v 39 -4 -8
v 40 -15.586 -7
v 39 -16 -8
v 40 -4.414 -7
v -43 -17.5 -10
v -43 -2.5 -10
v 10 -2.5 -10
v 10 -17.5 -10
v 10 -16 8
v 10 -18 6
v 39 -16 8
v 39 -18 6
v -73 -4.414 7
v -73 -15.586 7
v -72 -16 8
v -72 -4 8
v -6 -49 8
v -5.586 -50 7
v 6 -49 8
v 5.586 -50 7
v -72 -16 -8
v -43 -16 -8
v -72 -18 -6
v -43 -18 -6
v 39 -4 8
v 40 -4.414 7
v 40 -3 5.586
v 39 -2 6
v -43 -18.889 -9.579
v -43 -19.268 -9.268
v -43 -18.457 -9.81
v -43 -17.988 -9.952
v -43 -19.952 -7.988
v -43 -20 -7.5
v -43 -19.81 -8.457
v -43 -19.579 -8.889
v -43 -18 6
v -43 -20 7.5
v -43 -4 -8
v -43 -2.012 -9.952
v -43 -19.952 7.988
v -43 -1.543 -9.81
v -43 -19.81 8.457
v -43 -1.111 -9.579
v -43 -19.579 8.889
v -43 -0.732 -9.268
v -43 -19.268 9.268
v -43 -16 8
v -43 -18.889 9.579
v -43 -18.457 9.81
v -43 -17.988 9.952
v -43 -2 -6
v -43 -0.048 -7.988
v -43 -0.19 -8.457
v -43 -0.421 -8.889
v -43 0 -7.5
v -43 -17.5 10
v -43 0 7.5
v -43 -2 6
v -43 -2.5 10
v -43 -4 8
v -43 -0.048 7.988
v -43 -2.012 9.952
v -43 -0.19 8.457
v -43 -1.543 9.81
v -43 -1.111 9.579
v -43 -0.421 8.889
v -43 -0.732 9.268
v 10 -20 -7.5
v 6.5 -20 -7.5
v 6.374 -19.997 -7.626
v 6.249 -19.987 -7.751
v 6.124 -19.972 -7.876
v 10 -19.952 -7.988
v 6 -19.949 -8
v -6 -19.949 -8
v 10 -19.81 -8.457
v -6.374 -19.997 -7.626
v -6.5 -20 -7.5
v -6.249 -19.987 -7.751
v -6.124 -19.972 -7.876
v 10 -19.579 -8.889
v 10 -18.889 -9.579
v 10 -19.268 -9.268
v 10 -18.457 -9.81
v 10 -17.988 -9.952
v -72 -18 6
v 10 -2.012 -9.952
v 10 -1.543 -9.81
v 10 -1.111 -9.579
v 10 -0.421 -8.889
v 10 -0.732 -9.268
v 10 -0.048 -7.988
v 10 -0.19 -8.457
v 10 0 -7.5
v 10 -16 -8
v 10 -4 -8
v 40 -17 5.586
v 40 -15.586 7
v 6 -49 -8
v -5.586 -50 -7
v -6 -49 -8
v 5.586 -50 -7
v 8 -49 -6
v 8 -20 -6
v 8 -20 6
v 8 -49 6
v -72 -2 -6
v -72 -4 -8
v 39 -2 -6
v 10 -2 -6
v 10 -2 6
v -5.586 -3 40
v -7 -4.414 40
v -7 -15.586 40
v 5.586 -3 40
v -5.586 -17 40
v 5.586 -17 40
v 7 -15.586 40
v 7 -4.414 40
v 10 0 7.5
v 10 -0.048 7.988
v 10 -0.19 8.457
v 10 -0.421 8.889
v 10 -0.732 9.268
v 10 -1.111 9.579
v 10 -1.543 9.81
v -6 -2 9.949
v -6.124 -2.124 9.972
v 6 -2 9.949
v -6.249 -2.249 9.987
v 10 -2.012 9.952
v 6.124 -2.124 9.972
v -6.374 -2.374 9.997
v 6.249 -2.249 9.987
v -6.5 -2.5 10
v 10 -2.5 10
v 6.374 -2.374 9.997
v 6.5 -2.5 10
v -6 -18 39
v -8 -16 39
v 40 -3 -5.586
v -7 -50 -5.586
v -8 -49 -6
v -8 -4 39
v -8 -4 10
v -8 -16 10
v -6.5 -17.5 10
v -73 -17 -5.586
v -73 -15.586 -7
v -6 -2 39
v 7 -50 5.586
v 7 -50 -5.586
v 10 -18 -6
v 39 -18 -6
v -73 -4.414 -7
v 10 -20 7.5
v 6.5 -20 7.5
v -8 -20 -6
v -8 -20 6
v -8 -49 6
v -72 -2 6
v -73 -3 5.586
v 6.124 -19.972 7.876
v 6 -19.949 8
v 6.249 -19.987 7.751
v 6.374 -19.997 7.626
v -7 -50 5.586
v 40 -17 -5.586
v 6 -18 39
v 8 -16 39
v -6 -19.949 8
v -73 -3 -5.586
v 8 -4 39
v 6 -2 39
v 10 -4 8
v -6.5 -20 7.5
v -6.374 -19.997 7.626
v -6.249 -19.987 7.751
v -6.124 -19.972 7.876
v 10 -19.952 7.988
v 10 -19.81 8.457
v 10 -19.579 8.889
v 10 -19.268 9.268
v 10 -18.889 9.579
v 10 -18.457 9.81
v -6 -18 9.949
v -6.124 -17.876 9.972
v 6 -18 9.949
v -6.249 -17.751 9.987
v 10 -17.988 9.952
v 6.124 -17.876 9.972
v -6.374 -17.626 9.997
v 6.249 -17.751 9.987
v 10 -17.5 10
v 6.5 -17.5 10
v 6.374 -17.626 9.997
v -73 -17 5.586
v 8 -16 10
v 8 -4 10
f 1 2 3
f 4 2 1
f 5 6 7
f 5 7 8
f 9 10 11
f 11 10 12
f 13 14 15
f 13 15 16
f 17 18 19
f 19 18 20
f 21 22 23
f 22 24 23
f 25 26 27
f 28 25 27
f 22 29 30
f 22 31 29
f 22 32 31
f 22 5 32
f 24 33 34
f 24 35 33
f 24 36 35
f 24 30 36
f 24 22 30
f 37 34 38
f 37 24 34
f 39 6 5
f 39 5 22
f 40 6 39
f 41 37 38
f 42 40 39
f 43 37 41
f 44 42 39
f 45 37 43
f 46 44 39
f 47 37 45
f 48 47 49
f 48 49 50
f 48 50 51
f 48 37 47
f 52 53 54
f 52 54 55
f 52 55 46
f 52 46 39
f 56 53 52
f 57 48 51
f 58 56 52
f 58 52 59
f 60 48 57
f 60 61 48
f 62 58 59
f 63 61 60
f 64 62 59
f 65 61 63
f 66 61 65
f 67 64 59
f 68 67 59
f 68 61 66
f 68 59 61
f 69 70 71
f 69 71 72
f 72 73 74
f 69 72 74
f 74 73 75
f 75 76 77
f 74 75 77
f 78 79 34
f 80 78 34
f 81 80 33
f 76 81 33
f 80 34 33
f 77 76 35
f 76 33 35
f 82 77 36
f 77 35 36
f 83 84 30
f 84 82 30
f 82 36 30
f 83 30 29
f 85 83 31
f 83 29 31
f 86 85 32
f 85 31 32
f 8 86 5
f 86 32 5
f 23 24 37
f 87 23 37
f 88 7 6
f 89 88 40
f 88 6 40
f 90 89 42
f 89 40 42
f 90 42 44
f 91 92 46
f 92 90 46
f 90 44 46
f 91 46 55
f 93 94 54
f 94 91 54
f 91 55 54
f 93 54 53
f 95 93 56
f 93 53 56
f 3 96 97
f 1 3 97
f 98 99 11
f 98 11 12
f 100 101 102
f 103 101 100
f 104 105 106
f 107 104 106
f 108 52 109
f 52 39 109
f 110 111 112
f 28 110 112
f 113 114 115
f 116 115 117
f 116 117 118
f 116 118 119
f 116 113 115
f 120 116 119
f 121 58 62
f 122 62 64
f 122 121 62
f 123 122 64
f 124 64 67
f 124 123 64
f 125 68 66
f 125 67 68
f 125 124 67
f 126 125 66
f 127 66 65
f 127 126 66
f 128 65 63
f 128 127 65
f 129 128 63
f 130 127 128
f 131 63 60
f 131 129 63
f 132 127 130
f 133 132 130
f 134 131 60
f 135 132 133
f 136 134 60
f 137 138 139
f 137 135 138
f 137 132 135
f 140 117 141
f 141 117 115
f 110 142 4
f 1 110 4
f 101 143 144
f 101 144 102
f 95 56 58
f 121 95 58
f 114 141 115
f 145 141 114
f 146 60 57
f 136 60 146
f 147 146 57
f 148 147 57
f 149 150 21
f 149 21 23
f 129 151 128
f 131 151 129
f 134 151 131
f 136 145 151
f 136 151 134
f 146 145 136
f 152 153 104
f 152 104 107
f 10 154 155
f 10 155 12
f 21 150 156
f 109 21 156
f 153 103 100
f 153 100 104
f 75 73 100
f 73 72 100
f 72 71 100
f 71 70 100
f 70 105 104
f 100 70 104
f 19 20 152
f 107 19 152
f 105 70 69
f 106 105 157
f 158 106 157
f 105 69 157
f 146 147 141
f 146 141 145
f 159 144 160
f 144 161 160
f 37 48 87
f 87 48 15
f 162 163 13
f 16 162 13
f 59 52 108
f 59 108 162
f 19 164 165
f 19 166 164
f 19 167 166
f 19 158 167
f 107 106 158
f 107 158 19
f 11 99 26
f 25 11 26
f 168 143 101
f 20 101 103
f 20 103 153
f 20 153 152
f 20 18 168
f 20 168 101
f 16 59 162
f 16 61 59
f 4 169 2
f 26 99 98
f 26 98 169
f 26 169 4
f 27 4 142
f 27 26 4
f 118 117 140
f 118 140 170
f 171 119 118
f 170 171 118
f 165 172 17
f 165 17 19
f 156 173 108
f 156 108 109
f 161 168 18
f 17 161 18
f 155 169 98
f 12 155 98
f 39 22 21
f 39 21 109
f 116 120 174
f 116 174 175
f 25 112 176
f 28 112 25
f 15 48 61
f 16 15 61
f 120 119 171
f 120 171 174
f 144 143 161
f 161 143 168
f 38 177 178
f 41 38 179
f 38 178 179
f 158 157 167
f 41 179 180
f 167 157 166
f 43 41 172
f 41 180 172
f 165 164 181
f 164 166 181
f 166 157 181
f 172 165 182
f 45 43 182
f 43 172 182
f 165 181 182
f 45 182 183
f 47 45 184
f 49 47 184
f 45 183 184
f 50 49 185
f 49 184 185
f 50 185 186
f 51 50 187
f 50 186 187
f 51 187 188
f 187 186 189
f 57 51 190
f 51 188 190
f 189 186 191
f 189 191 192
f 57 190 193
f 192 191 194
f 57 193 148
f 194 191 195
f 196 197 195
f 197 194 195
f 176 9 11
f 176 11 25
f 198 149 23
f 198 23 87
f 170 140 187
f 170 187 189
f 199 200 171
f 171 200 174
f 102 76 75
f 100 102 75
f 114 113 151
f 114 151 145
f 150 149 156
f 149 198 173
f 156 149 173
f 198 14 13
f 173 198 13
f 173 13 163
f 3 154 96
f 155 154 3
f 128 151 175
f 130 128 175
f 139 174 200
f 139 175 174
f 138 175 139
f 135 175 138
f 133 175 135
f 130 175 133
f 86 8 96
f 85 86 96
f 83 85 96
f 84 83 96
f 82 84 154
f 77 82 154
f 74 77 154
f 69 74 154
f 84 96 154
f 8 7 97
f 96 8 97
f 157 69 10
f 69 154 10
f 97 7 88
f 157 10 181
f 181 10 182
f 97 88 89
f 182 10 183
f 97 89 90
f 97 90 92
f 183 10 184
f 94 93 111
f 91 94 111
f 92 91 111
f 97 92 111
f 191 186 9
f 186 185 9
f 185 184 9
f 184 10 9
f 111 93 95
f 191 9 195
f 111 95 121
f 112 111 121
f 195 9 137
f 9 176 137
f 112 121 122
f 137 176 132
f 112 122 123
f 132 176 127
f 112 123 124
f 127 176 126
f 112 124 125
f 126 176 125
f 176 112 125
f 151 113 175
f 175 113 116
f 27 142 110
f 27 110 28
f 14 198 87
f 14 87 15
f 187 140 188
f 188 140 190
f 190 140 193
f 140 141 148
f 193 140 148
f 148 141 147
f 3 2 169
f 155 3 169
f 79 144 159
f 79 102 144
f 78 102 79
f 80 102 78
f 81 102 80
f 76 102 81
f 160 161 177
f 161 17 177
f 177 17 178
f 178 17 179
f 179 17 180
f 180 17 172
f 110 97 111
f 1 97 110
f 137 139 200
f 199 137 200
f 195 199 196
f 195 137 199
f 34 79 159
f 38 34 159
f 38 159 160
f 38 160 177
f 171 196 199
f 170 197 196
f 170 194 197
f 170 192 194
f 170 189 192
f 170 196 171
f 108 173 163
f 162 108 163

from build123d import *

# Parameters (mm, degrees)
F0_W          = 16
F0_H          = 16
F1_DEPTH      = 50
F0_W_2        = 20
F0_H_2        = 20
F2_DEPTH      = 20
F3_W          = 16
F3_H          = 16
F4_DEPTH      = 40
F5_W          = 16
F5_H          = 16
F6_DEPTH      = 73
F7_W          = 16
F7_H          = 16
F8_DEPTH      = 40
F9_DEPTH      = 33
F10_T1_DEPTH  = 65.5
F10_T6_DEPTH  = 65.5
F10_T11_DEPTH = 65.5
F10_T17_DEPTH = 65.5
F10_T22_DEPTH = 65.5
F10_T27_DEPTH = 65.5
F10_T32_DEPTH = 65.5
F10_T37_DEPTH = 65.5
F10_T42_DEPTH = 65.5
F10_T47_DEPTH = 65.5
F11_SIZE      = 2
F12_SIZE      = 1


# Not quite as in the source:
# - a fillet or chamfer that OpenCascade refuses, or shapes differently, is made with other operations: its cross-section is extruded or revolved along the edge and cut away or added


with BuildPart() as f1:
    # F0 (on Front) → F1 (new body)
    with BuildSketch(Plane.XZ):
        Rectangle(F0_W, F0_H)
    extrude(amount=F1_DEPTH)

    # F0 (on Front) → F2 (join)
    with BuildSketch(Plane.XZ):
        Rectangle(F0_W_2, F0_H_2)
        Rectangle(F0_W, F0_H, mode=Mode.SUBTRACT)
    extrude(amount=F2_DEPTH)

    # F3 (on Right) → F4 (join)
    with BuildSketch(Plane.YZ):
        with Locations((-10, 0)):
            Rectangle(F3_W, F3_H)
    extrude(amount=F4_DEPTH)

    # F5 (on Right) → F6 (join)
    with BuildSketch(Plane.YZ):
        with Locations((-10, 0)):
            Rectangle(F5_W, F5_H)
    extrude(amount=-F6_DEPTH)

    # F7 (on Top) → F8 (join)
    with BuildSketch(Plane.XY):
        with Locations((0, -10)):
            Rectangle(F7_W, F7_H)
    extrude(amount=F8_DEPTH)

    # F9 (add): a face of the model
    f9_faces = [f1.faces().sort_by_distance(p)[0] for p in [
        (-10, -10, 9.7171572875),
    ]]
    extrude(f9_faces, amount=F9_DEPTH)

    # F10: fillet of radius 2.5 on 4 edges, made by hand

    # F10_s2 → F10_t1 (cut)
    with BuildSketch(Plane.YZ.offset(-49.25)):
        with BuildLine():
            ThreePointArc((-2.5, -10), (-0.732233047, -9.267766953), (0, -7.5))
            Line((0, -7.5), (0, -10))
            Line((0, -10), (-2.5, -10))
        make_face()
    extrude(amount=F10_T1_DEPTH, mode=Mode.SUBTRACT)


with BuildPart() as f10_tool4:
    # F10_s5 → F10_t6 (new body)
    with BuildSketch(Plane.YZ.offset(16.25)):
        with BuildLine():
            ThreePointArc((-20, 7.5), (-19.267766953, 9.267766953), (-17.5, 10))
            Line((-17.5, 10), (-20, 10))
            Line((-20, 10), (-20, 7.5))
        make_face()
    extrude(amount=-F10_T6_DEPTH)

    split(bisect_by=Plane.YZ.offset(8), keep=Keep.TOP)


with BuildPart() as f1_1:
    add(f1.part)

    # F10_t3: cut F10_tool4
    add(f10_tool4.part, mode=Mode.SUBTRACT)


with BuildPart() as f10_tool9:
    # F10_s10 → F10_t11 (new body)
    with BuildSketch(Plane.YZ.offset(16.25)):
        with BuildLine():
            ThreePointArc((-20, 7.5), (-19.267766953, 9.267766953), (-17.5, 10))
            Line((-17.5, 10), (-20, 10))
            Line((-20, 10), (-20, 7.5))
        make_face()
    extrude(amount=-F10_T11_DEPTH)

    split(bisect_by=Plane.XY.offset(8), keep=Keep.TOP)

    split(bisect_by=Plane.XZ.offset(18), keep=Keep.TOP)


with BuildPart() as f1_2:
    add(f1_1.part)

    # F10_t8: cut F10_tool9
    add(f10_tool9.part, mode=Mode.SUBTRACT)


with BuildPart() as f10_tool15:
    # F10_s16 → F10_t17 (new body)
    with BuildSketch(Plane.YZ.offset(16.25)):
        with BuildLine():
            ThreePointArc((-20, 7.5), (-19.267766953, 9.267766953), (-17.5, 10))
            Line((-17.5, 10), (-20, 10))
            Line((-20, 10), (-20, 7.5))
        make_face()
    extrude(amount=-F10_T17_DEPTH)

    split(bisect_by=Plane.YZ.offset(-8), keep=Keep.BOTTOM)


with BuildPart() as f1_3:
    add(f1_2.part)

    # F10_t14: cut F10_tool15
    add(f10_tool15.part, mode=Mode.SUBTRACT)


with BuildPart() as f10_tool20:
    # F10_s21 → F10_t22 (new body)
    with BuildSketch(Plane.YZ.offset(-49.25)):
        with BuildLine():
            ThreePointArc((-20, -7.5), (-19.267766953, -9.267766953), (-17.5, -10))
            Line((-17.5, -10), (-20, -10))
            Line((-20, -10), (-20, -7.5))
        make_face()
    extrude(amount=F10_T22_DEPTH)

    split(bisect_by=Plane.YZ.offset(-8), keep=Keep.BOTTOM)


with BuildPart() as f1_4:
    add(f1_3.part)

    # F10_t19: cut F10_tool20
    add(f10_tool20.part, mode=Mode.SUBTRACT)


with BuildPart() as f10_tool25:
    # F10_s26 → F10_t27 (new body)
    with BuildSketch(Plane.YZ.offset(-49.25)):
        with BuildLine():
            ThreePointArc((-20, -7.5), (-19.267766953, -9.267766953), (-17.5, -10))
            Line((-17.5, -10), (-20, -10))
            Line((-20, -10), (-20, -7.5))
        make_face()
    extrude(amount=F10_T27_DEPTH)

    split(bisect_by=Plane.XY.offset(-8), keep=Keep.BOTTOM)


with BuildPart() as f1_5:
    add(f1_4.part)

    # F10_t24: cut F10_tool25
    add(f10_tool25.part, mode=Mode.SUBTRACT)


with BuildPart() as f10_tool30:
    # F10_s31 → F10_t32 (new body)
    with BuildSketch(Plane.YZ.offset(-49.25)):
        with BuildLine():
            ThreePointArc((-20, -7.5), (-19.267766953, -9.267766953), (-17.5, -10))
            Line((-17.5, -10), (-20, -10))
            Line((-20, -10), (-20, -7.5))
        make_face()
    extrude(amount=F10_T32_DEPTH)

    split(bisect_by=Plane.YZ.offset(8), keep=Keep.TOP)


with BuildPart() as f1_6:
    add(f1_5.part)

    # F10_t29: cut F10_tool30
    add(f10_tool30.part, mode=Mode.SUBTRACT)


with BuildPart() as f10_tool35:
    # F10_s36 → F10_t37 (new body)
    with BuildSketch(Plane.YZ.offset(16.25)):
        with BuildLine():
            ThreePointArc((0, 7.5), (-0.732233047, 9.267766953), (-2.5, 10))
            Line((-2.5, 10), (0, 10))
            Line((0, 10), (0, 7.5))
        make_face()
    extrude(amount=-F10_T37_DEPTH)

    split(bisect_by=Plane.XZ.offset(2), keep=Keep.BOTTOM)


with BuildPart() as f1_7:
    add(f1_6.part)

    # F10_t34: cut F10_tool35
    add(f10_tool35.part, mode=Mode.SUBTRACT)


with BuildPart() as f10_tool40:
    # F10_s41 → F10_t42 (new body)
    with BuildSketch(Plane.YZ.offset(16.25)):
        with BuildLine():
            ThreePointArc((0, 7.5), (-0.732233047, 9.267766953), (-2.5, 10))
            Line((-2.5, 10), (0, 10))
            Line((0, 10), (0, 7.5))
        make_face()
    extrude(amount=-F10_T42_DEPTH)

    split(bisect_by=Plane.YZ.offset(8), keep=Keep.TOP)


with BuildPart() as f1_8:
    add(f1_7.part)

    # F10_t39: cut F10_tool40
    add(f10_tool40.part, mode=Mode.SUBTRACT)


with BuildPart() as f10_tool45:
    # F10_s46 → F10_t47 (new body)
    with BuildSketch(Plane.YZ.offset(16.25)):
        with BuildLine():
            ThreePointArc((0, 7.5), (-0.732233047, 9.267766953), (-2.5, 10))
            Line((-2.5, 10), (0, 10))
            Line((0, 10), (0, 7.5))
        make_face()
    extrude(amount=-F10_T47_DEPTH)

    split(bisect_by=Plane.YZ.offset(-8), keep=Keep.BOTTOM)


with BuildPart() as f1_9:
    add(f1_8.part)

    # F10_t44: cut F10_tool45
    add(f10_tool45.part, mode=Mode.SUBTRACT)

    # F11
    f11_edges = [f1_9.edges().sort_by_distance(p)[0] for p in [
        (-58, -18, 8),
        (-58, -18, -8),
        (-58, -2, 8),
        (-58, -2, -8),
        (-8, -34.974745, 8),
        (-8, -34.974745, -8),
        (8, -34.974745, 8),
        (8, -34.974745, -8),
        (25, -18, -8),
        (25, -18, 8),
        (8, -18, 24.974745),
        (-8, -18, 24.974745),
        (25, -2, -8),
        (25, -2, 8),
        (8, -2, 24.974745),
        (-8, -2, 24.974745),
    ]]
    chamfer(f11_edges, length=F11_SIZE)

    # F12
    f12_edges = [f1_9.edges().sort_by_distance(p)[0] for p in [
        (-73, -10, 8),
        (-73, -10, -8),
        (-73, -17, -7),
        (-73, -3, -7),
        (-73, -18, 0),
        (-73, -2, 0),
        (-73, -17, 7),
        (-73, -3, 7),
        (-8, -50, 0),
        (-7, -50, 7),
        (-7, -50, -7),
        (0, -50, 8),
        (0, -50, -8),
        (7, -50, 7),
        (7, -50, -7),
        (8, -50, 0),
        (-8, -10, 40),
        (-7, -3, 40),
        (-7, -17, 40),
        (0, -2, 40),
        (0, -18, 40),
        (7, -3, 40),
        (7, -17, 40),
        (8, -10, 40),
        (40, -10, -8),
        (40, -17, -7),
        (40, -3, -7),
        (40, -18, 0),
        (40, -2, 0),
        (40, -17, 7),
        (40, -3, 7),
        (40, -10, 8),
    ]]
    chamfer(f12_edges, length=F12_SIZE)


solid = f1_9.part
